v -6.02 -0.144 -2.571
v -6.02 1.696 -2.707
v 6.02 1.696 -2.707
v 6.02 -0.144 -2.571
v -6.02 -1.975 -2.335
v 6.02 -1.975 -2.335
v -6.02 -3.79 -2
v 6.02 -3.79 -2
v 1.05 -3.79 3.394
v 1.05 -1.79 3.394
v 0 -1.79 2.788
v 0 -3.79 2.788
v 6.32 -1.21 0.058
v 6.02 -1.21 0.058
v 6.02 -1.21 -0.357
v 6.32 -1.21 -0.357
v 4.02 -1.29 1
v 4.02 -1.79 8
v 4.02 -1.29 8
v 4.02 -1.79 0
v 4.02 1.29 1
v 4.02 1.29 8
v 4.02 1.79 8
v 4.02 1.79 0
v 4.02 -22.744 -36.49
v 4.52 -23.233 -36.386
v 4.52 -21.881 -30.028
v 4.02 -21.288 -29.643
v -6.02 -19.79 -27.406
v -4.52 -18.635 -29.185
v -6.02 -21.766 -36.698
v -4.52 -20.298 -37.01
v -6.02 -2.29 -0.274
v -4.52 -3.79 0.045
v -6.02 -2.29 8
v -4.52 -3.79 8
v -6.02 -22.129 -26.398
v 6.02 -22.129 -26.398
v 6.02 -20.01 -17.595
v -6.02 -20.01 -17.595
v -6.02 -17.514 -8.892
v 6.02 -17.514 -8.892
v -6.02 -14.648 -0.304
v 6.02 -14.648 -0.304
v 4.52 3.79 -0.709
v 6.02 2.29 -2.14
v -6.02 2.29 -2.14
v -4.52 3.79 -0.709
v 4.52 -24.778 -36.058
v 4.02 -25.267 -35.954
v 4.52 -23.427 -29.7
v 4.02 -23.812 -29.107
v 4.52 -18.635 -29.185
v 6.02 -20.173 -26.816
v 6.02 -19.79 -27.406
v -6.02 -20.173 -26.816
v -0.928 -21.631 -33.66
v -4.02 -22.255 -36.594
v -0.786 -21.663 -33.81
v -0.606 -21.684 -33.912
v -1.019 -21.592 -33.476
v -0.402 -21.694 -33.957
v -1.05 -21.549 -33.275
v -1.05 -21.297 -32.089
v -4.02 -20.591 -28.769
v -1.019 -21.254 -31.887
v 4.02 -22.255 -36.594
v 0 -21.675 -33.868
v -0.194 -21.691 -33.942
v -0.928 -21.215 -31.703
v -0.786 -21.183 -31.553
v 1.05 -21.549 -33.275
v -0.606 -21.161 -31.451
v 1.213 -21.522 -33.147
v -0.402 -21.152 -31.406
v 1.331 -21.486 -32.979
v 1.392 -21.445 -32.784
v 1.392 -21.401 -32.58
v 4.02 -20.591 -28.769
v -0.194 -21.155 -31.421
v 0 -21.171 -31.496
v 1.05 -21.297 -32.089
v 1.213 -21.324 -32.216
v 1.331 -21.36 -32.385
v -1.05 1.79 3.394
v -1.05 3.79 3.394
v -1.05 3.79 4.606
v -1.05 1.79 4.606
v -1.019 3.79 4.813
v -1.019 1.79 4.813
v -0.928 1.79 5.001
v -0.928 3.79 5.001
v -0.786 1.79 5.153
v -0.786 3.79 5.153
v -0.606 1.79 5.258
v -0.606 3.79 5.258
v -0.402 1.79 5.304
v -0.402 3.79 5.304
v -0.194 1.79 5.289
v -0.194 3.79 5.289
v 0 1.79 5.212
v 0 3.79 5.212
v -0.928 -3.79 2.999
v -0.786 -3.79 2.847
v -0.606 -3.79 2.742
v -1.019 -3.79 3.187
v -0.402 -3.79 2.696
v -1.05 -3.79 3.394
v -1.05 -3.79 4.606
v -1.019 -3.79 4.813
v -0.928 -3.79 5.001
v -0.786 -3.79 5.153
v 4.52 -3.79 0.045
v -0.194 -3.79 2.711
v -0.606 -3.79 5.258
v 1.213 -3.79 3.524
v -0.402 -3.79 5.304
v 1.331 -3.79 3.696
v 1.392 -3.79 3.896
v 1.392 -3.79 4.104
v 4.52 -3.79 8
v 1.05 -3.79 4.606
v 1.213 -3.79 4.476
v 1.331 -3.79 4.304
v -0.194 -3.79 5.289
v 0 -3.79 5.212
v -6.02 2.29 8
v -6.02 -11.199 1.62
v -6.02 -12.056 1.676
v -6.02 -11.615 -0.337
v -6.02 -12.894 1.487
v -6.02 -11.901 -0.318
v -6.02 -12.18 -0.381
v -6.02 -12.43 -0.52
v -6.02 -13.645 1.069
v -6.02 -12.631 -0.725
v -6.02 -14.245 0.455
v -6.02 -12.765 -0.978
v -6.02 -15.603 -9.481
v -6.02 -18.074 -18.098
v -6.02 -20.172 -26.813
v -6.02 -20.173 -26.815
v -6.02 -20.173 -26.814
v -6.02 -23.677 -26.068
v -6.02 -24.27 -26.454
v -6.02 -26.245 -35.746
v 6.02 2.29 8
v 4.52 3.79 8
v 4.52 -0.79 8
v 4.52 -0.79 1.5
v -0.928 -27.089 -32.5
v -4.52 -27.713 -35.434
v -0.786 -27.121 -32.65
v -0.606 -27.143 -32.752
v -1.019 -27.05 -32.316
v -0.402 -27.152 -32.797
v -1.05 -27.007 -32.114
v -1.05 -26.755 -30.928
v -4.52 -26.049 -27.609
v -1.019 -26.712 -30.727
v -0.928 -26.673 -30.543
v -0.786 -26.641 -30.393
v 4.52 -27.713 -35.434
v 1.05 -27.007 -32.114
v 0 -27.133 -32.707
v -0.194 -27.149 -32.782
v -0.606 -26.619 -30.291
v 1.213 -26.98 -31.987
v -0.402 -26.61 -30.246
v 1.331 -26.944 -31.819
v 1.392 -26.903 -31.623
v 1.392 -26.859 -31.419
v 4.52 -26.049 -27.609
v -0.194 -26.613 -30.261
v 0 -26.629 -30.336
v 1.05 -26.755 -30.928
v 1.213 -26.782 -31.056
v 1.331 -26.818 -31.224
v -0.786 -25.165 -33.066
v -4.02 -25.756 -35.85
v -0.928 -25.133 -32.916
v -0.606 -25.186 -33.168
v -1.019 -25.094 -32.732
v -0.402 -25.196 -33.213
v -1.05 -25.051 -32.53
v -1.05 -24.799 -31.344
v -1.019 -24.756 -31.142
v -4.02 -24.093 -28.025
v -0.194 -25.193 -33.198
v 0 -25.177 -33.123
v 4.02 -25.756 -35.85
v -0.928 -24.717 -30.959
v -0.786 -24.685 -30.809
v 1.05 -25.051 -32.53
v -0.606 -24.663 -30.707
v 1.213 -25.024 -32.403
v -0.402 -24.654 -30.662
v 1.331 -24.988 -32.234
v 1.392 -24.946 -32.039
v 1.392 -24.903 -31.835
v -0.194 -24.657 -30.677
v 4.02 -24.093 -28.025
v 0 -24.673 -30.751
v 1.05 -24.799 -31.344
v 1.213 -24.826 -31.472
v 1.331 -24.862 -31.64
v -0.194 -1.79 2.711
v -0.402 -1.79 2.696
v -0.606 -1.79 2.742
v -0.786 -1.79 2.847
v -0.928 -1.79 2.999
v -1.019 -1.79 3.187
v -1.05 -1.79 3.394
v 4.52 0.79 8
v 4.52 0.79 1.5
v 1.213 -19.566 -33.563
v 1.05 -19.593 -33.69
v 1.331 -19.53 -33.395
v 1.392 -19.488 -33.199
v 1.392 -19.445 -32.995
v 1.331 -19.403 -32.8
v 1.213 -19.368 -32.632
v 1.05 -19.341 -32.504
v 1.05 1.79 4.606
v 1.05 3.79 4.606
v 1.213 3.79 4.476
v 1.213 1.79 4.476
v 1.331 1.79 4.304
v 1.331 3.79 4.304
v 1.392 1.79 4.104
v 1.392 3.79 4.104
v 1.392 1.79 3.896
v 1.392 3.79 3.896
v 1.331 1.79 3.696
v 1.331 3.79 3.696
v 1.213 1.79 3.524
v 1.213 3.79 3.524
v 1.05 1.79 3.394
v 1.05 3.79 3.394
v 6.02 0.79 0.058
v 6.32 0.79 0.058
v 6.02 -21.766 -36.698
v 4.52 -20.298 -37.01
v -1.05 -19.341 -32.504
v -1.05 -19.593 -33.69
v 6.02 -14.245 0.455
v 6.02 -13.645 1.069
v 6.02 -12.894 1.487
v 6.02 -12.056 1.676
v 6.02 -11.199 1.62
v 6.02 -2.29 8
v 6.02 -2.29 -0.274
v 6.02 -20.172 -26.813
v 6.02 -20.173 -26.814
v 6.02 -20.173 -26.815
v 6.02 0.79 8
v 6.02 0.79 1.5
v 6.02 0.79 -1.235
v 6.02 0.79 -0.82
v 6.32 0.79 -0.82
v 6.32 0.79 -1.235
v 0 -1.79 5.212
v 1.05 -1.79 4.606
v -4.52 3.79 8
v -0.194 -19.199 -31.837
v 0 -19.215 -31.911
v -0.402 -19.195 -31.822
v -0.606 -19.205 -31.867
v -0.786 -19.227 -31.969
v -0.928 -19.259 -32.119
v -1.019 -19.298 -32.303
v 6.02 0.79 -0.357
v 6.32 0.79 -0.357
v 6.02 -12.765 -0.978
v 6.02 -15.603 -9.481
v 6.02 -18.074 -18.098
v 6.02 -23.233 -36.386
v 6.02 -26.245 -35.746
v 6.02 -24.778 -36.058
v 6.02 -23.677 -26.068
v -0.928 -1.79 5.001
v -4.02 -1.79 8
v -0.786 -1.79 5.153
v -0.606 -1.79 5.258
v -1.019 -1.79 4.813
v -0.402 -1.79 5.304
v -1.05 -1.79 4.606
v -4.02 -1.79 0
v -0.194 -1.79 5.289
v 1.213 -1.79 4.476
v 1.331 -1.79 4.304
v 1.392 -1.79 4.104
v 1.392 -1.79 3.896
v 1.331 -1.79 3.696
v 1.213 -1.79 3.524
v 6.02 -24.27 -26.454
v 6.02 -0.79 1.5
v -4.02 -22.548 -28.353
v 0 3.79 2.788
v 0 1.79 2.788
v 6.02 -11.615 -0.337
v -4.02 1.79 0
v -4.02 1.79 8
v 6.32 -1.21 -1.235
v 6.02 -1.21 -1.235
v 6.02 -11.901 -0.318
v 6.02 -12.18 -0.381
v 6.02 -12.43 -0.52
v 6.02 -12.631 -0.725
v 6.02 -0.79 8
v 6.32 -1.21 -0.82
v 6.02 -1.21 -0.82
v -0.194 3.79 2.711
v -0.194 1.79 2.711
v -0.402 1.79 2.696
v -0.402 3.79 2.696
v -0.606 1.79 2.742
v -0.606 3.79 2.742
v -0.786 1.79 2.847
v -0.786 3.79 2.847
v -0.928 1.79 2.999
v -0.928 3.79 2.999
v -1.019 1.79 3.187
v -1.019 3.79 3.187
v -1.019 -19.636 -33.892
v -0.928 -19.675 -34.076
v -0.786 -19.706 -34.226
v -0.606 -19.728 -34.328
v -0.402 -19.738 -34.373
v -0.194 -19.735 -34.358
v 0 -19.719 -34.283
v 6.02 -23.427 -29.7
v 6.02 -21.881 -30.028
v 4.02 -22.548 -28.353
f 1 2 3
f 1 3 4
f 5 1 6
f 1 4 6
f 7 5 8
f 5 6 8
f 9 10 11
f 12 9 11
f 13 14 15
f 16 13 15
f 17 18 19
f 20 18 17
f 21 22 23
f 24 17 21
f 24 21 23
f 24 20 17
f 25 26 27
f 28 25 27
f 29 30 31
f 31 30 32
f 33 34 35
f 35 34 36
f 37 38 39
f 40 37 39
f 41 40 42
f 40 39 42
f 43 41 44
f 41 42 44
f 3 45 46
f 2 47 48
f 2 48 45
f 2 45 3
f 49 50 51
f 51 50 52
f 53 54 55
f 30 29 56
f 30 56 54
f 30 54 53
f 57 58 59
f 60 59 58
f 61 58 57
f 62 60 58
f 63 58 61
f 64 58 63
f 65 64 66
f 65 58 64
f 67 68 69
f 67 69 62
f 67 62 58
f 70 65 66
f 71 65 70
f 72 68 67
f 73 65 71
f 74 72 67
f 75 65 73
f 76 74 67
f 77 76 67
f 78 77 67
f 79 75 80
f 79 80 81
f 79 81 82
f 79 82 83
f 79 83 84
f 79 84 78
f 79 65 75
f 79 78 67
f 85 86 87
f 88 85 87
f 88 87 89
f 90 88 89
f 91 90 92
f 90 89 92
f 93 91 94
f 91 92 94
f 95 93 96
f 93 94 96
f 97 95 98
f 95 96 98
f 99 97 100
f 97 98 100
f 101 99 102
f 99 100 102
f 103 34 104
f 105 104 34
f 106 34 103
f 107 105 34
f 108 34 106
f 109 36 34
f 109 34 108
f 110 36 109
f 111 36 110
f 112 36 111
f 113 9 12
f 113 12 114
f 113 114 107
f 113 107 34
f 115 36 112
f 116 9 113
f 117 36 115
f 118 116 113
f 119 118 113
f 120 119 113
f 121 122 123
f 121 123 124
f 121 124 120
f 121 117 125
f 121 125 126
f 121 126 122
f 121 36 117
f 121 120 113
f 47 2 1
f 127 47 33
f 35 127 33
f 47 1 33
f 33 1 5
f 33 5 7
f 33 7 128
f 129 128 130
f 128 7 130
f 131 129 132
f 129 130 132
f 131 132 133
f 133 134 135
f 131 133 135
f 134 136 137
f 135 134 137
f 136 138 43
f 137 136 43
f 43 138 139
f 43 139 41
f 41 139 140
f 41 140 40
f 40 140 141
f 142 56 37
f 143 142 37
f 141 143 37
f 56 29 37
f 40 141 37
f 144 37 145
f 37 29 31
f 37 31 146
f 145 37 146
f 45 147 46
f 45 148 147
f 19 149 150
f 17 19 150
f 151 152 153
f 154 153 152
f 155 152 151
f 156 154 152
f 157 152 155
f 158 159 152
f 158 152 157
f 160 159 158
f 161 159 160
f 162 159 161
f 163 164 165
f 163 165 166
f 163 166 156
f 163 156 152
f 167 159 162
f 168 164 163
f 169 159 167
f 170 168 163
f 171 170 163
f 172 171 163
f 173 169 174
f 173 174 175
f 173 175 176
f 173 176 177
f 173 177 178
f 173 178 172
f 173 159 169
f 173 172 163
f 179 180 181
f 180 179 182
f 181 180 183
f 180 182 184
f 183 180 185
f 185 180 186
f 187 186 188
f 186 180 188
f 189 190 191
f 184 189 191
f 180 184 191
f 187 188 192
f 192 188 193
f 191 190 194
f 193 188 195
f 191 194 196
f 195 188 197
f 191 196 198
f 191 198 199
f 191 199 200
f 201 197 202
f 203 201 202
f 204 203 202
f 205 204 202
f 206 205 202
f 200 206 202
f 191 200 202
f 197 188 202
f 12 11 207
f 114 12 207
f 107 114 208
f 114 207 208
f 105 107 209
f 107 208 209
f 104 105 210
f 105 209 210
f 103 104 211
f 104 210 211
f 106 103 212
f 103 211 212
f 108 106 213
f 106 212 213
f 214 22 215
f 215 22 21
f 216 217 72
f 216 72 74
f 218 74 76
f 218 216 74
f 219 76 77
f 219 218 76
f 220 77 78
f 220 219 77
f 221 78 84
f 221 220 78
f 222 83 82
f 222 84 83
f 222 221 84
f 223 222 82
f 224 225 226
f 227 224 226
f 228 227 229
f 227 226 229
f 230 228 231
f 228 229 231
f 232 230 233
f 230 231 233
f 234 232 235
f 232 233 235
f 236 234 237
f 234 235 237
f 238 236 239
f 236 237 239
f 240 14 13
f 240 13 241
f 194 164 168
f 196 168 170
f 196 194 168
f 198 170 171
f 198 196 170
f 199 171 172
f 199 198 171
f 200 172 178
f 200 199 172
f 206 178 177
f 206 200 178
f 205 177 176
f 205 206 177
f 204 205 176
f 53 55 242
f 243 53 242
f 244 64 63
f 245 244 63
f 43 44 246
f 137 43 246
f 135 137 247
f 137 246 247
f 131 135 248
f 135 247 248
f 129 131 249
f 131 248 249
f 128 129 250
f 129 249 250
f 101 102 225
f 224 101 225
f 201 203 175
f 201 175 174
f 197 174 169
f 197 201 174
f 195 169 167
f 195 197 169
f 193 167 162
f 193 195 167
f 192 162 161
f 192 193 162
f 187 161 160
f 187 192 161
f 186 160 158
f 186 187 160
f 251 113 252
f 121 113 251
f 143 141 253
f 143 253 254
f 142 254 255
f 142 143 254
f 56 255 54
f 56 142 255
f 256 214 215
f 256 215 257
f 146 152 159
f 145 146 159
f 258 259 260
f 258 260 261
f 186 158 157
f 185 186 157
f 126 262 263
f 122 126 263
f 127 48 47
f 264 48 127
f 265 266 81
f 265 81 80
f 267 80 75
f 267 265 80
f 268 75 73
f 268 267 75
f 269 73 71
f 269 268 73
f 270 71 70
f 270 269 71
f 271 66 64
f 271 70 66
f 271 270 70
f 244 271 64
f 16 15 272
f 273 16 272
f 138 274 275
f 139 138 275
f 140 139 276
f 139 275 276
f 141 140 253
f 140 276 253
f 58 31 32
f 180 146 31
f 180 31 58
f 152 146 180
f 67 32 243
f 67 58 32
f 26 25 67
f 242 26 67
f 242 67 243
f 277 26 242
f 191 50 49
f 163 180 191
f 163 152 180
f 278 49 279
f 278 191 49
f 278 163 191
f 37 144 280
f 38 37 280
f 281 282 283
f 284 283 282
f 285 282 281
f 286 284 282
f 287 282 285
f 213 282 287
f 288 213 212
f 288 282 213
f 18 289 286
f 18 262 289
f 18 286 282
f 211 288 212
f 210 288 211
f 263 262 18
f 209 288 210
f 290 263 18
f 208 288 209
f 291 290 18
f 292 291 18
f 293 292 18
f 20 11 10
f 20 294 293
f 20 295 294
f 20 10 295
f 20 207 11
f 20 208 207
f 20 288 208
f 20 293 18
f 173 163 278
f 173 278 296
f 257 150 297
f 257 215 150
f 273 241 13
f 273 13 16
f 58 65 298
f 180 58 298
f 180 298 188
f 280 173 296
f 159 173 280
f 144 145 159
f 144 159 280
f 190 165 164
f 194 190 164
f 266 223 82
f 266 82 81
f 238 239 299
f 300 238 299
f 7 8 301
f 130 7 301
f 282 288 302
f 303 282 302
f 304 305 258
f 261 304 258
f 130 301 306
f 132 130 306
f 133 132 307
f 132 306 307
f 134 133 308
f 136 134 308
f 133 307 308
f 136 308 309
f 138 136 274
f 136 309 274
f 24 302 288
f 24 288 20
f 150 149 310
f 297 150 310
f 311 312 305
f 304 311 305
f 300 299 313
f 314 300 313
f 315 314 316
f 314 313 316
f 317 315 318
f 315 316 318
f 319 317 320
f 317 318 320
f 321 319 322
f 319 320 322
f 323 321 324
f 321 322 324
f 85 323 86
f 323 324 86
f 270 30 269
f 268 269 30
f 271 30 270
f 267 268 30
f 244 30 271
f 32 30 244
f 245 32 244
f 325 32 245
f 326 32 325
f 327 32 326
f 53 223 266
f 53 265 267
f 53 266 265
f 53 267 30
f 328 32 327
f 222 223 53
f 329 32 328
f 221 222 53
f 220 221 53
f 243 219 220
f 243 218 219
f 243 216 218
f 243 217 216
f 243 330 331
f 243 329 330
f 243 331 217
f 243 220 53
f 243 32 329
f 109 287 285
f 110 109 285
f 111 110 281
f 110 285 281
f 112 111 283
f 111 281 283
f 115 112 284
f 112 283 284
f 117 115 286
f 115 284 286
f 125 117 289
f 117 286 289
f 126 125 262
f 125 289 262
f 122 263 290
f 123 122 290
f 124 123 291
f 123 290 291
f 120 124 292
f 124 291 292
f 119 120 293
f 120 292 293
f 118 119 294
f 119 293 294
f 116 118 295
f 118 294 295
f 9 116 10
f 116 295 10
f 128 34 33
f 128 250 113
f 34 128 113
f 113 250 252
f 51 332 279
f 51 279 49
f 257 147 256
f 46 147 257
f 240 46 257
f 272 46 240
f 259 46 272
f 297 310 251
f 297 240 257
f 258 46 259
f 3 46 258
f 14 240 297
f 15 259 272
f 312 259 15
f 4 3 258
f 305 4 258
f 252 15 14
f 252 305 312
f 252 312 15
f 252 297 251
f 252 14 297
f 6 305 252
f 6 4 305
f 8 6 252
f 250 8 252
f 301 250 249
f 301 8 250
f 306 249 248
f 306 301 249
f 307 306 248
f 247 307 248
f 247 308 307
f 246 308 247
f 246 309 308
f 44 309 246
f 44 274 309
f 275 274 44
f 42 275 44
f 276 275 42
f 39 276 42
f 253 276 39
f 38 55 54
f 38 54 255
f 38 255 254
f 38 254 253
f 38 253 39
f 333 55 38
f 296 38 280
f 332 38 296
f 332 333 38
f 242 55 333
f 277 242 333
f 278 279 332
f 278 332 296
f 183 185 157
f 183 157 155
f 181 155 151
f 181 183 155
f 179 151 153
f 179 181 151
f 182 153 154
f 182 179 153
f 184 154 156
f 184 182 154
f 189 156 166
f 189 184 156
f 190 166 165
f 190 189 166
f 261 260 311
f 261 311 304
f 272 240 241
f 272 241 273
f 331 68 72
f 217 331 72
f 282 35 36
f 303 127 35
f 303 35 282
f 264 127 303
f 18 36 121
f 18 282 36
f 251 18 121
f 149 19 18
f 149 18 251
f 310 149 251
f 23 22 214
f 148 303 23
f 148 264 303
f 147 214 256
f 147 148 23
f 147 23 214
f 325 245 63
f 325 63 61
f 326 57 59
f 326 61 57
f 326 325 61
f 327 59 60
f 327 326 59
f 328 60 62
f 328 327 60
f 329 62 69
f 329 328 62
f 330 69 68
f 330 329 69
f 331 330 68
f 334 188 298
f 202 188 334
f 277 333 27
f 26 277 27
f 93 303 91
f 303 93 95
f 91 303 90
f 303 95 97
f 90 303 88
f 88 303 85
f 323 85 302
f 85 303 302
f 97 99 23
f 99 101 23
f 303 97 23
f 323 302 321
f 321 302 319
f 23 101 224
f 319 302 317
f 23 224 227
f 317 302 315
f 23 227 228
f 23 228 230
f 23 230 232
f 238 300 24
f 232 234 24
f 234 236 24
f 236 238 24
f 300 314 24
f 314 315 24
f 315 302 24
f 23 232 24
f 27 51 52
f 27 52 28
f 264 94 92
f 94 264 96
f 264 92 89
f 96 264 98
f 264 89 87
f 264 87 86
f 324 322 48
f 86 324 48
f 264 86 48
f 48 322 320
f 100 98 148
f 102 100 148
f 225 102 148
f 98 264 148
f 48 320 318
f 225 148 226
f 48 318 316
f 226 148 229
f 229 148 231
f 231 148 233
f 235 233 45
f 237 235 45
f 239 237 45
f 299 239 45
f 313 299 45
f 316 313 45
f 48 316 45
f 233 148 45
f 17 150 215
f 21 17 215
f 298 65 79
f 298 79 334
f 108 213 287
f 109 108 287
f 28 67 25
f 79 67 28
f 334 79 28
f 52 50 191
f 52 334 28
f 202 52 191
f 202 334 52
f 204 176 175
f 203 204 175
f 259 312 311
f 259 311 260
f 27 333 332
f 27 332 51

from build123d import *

# Parameters (mm, degrees)
SKETCH1_W                      = 12.04
SKETCH1_H                      = 7.58
SKETCH1_W_2                    = 8.04
SKETCH1_H_2                    = 3.58
BOSS_EXTRUDE1_DEPTH            = 8
SKETCH1_2_W                    = 12.04
SKETCH1_2_H                    = 7.58
SKETCH1_2_W_2                  = 8.04
SKETCH1_2_H_2                  = 3.58
BOSS_EXTRUDE2_DEPTH            = 2
EXTRUDE_THIN1_DEPTH            = 12.04
SKETCH5_W                      = 12.04
SKETCH5_H                      = 7.58
SKETCH5_W_2                    = 8.04
SKETCH5_H_2                    = 3.58
BOSS_EXTRUDE4_DEPTH            = 8
SKETCH5_4_W                    = 12.04
SKETCH5_4_H                    = 7.58
BOSS_EXTRUDE5_DEPTH            = 2
CHAMFER1_SIZE                  = 1.5
CHAMFER2_START                 = -7
CHAMFER2_DEPTH                 = 14
CUT_EXTRUDE1_REACH             = 50.973
CUT_EXTRUDE1_DIRECTION_2_DEPTH = 49.973440368
CUT_EXTRUDE2_DEPTH             = 48.541116576
CUT_EXTRUDE2_DEPTH_BACK        = 48.541116576
SKETCH8_W                      = 2
SKETCH8_H                      = 1.58
CUT_EXTRUDE3_DEPTH             = 6.5
SKETCH9_W                      = 4
SKETCH9_H                      = 1.58
CUT_EXTRUDE4_DEPTH             = 6.5
CHAMFER3_SIZE                  = 0.5
SKETCH10_W                     = 0.414634146
SKETCH10_H                     = 2
SKETCH10_W_2                   = 0.414634147
BOSS_EXTRUDE6_DEPTH            = 0.3


with BuildPart() as part:
    # Sketch1 → Boss-Extrude1 (new body)
    with BuildSketch(Plane.XY):
        Rectangle(SKETCH1_W, SKETCH1_H)
        Rectangle(SKETCH1_W_2, SKETCH1_H_2, mode=Mode.SUBTRACT)
    extrude(amount=BOSS_EXTRUDE1_DEPTH)

    # Sketch1<2> → Boss-Extrude2 (add)
    # profile 1 of 2: a face of its own
    with BuildSketch(Plane.XY):
        Rectangle(SKETCH1_2_W, SKETCH1_2_H)
        Rectangle(SKETCH1_2_W_2, SKETCH1_2_H_2, mode=Mode.SUBTRACT)
    # profile 2 of 2: a face of its own
    with BuildSketch(Plane.XY):
        Rectangle(SKETCH1_2_W_2, SKETCH1_2_H_2)
    extrude(amount=-BOSS_EXTRUDE2_DEPTH)

    # Sketch3 → Extrude-Thin1 (add)
    with BuildSketch(Plane(origin=(6.02, 9.81, 0), x_dir=(0, -1, 0), z_dir=(1, 0, 0))):
        with BuildLine():
            Line((6.02, 2.744137986), (6.52, 2.744137986))
            ThreePointArc((6.52, 2.744137986), (10.07949931, 2.557592532), (13.6, 2))
            Line((13.6, 2), (21.425180806, 0.336706473))
            ThreePointArc((21.425180806, 0.336706473), (22.120268588, 0.441550315), (22.574623539, 0.977927827))
            ThreePointArc((22.574623539, 0.977927827), (26.849152106, 14.317688881), (30.219561316, 27.914054616))
            Line((30.219561316, 27.914054616), (30.401286915, 28.769006338))
            Line((30.401286915, 28.769006338), (32.357582116, 28.353182957))
            Line((32.357582116, 28.353182957), (32.175856518, 27.498231234))
            ThreePointArc((32.175856518, 27.498231234), (28.773161162, 13.771621897), (24.457685624, 0.304075332))
            ThreePointArc((24.457685624, 0.304075332), (23.094620772, -1.305057203), (21.009357424, -1.619588728))
            Line((21.009357424, -1.619588728), (13.184176618, 0.043704799))
            ThreePointArc((13.184176618, 0.043704799), (9.870442383, 0.568548741), (6.52, 0.744137986))
            Line((6.52, 0.744137986), (6.02, 0.744137986))
            Line((6.02, 0.744137986), (6.02, 2.744137986))
        make_face()
    extrude(amount=-EXTRUDE_THIN1_DEPTH)



with BuildPart() as body_2:
    # Sketch5 → Boss-Extrude4 (new body)
    with BuildSketch(Plane(origin=(0, 484.189145571, -136.063399466), x_dir=(1, 0, 0), z_dir=(0, -0.20791169081775487, -0.9781476007338067))):
        with Locations((0, 517.847527624)):
            Rectangle(SKETCH5_W, SKETCH5_H)
        with Locations((0, 517.847527624)):
            Rectangle(SKETCH5_W_2, SKETCH5_H_2, mode=Mode.SUBTRACT)
    extrude(amount=BOSS_EXTRUDE4_DEPTH)


with BuildPart() as part_1:
    add(part.part)

    add(body_2.part)  # Boss-Extrude5 merges body 2
    # Sketch5<4> → Boss-Extrude5 (add)
    with BuildSketch(Plane(origin=(0, 484.189145571, -136.063399466), x_dir=(1, 0, 0), z_dir=(0, -0.20791169081775487, -0.9781476007338067))):
        with Locations((0, 517.847527624)):
            Rectangle(SKETCH5_4_W, SKETCH5_4_H)
    extrude(amount=-BOSS_EXTRUDE5_DEPTH)

    # Chamfer1
    chamfer1_edges = [part_1.edges().sort_by_distance(p)[0] for p in [
        (6.02, -26.673085599, -30.543301906),
        (-6.02, -26.673085599, -30.543301906),
        (6.02, 3.79, 2.627931007),
        (6.02, -3.79, 4.022340595),
        (-6.02, -3.79, 4.022340595),
        (-6.02, 3.79, 2.627931007),
        (6.02, -19.258726786, -32.119272522),
        (-6.02, -19.258726786, -32.119272522),
    ]]
    chamfer(chamfer1_edges, length=CHAMFER1_SIZE)

    # Chamfer2: read off the stored shape, not the designer's step
    # Chamfer2 outline → Chamfer2 (cut)
    with BuildSketch(Plane.YZ.offset(CHAMFER2_START)):
        with BuildLine():
            Line((3.79, -2.744137986), (3.79, -0.709020541))
            Line((3.79, -0.709020541), (1.696404781, -2.706829325))
            ThreePointArc((1.696404781, -2.706829325), (2.492984056, -2.734809543), (3.29, -2.744137986))
            Line((3.29, -2.744137986), (3.79, -2.744137986))
        make_face()
        Polygon((-25.633527145, -25.652563902), (-26.049350527, -27.608859104), (-23.677231944, -26.068387284), align=None)
        with BuildLine():
            ThreePointArc((-20.172493797, -26.813342374), (-20.172815684, -26.814817596), (-20.173137561, -26.81629282))
            Line((-20.173137561, -26.81629282), (-18.634991713, -29.18482972))
            Line((-18.634991713, -29.18482972), (-18.219168332, -27.228534519))
            Line((-18.219168332, -27.228534519), (-20.172493797, -26.813342374))
        make_face()
    extrude(amount=CHAMFER2_DEPTH, mode=Mode.SUBTRACT)

    # Cut-Extrude1: up to this face of the body (flat: up to its plane)
    cut_extrude1_end = Plane(part_1.part.faces().sort_by_distance((0, -3.79, 4.022340595))[0])
    # Sketch6 → Cut-Extrude1 (cut, up to the picked face)
    with BuildSketch(Plane(origin=(0, 3.79, 0), x_dir=(1, 0, 0), z_dir=(0, 1, 0)), mode=Mode.PRIVATE) as cut_extrude1_sk1:
        with BuildLine():
            Line((1.05, -3.393782217), (0, -2.787564435))
            ThreePointArc((0, -2.787564435), (-0.7, -2.787564435), (-1.05, -3.393782217))
            Line((-1.05, -3.393782217), (-1.05, -4.606217783))
            ThreePointArc((-1.05, -4.606217783), (-0.7, -5.212435565), (0, -5.212435565))
            Line((0, -5.212435565), (1.05, -4.606217783))
            ThreePointArc((1.05, -4.606217783), (1.4, -4), (1.05, -3.393782217))
        make_face()
    cut_extrude1_tool1 = split(extrude(cut_extrude1_sk1.sketch, amount=-CUT_EXTRUDE1_REACH, mode=Mode.PRIVATE), bisect_by=cut_extrude1_end, keep=Keep.BOTH, mode=Mode.PRIVATE)
    add(cut_extrude1_tool1.solids().sort_by(Axis((0, 3.79, 4), (0, -1, 0)))[0], mode=Mode.SUBTRACT)

    # Sketch6 → Cut-Extrude1 direction 2 (cut)
    with BuildSketch(Plane(origin=(0, 3.79, 0), x_dir=(1, 0, 0), z_dir=(0, 1, 0))):
        with BuildLine():
            Line((1.05, -3.393782217), (0, -2.787564435))
            ThreePointArc((0, -2.787564435), (-0.7, -2.787564435), (-1.05, -3.393782217))
            Line((-1.05, -3.393782217), (-1.05, -4.606217783))
            ThreePointArc((-1.05, -4.606217783), (-0.7, -5.212435565), (0, -5.212435565))
            Line((0, -5.212435565), (1.05, -4.606217783))
            ThreePointArc((1.05, -4.606217783), (1.4, -4), (1.05, -3.393782217))
        make_face()
    extrude(amount=CUT_EXTRUDE1_DIRECTION_2_DEPTH, mode=Mode.SUBTRACT)

    # Sketch7 → Cut-Extrude2 (cut, two sides: drawn at the far end of the back side and taken through both)
    with BuildSketch(Plane(origin=(0, -19.308540852, 4.104157054), x_dir=(1, 0, 0), z_dir=(0, -0.9781476007338067, 0.2079116908177549)).offset(-CUT_EXTRUDE2_DEPTH_BACK)):
        with BuildLine():
            Line((1.05, -35.815286021), (0, -35.209068239))
            ThreePointArc((0, -35.209068239), (-0.7, -35.209068239), (-1.05, -35.815286021))
            Line((-1.05, -35.815286021), (-1.05, -37.027721587))
            ThreePointArc((-1.05, -37.027721587), (-0.7, -37.633939369), (0, -37.633939369))
            Line((0, -37.633939369), (1.05, -37.027721587))
            ThreePointArc((1.05, -37.027721587), (1.4, -36.421503804), (1.05, -35.815286021))
        make_face()
    extrude(amount=CUT_EXTRUDE2_DEPTH + CUT_EXTRUDE2_DEPTH_BACK, mode=Mode.SUBTRACT)

    # Sketch8 → Cut-Extrude3 (cut)
    with BuildSketch(Plane.XY.offset(8)):
        with Locations((5.02, 0)):
            Rectangle(SKETCH8_W, SKETCH8_H)
    extrude(amount=-CUT_EXTRUDE3_DEPTH, mode=Mode.SUBTRACT)

    # Sketch9 → Cut-Extrude4 (cut)
    with BuildSketch(Plane(origin=(0, -8.404103201, -39.538196964), x_dir=(-1, 0, 0), z_dir=(0, -0.20791169081775673, -0.9781476007338064))):
        with Locations((-6.02, -15.949905141)):
            Rectangle(SKETCH9_W, SKETCH9_H)
    extrude(amount=-CUT_EXTRUDE4_DEPTH, mode=Mode.SUBTRACT)

    # Chamfer3
    chamfer3_edges = [part_1.edges().sort_by_distance(p)[0] for p in [
        (4.02, -0.79, 4.75),
        (4.02, 0.79, 4.75),
        (4.02, 0, 1.5),
        (4.02, -24.102488256, -32.87879528),
        (4.02, -22.654038656, -29.864065813),
        (4.02, -22.557015047, -33.207295751),
    ]]
    chamfer(chamfer3_edges, length=CHAMFER3_SIZE)

    # Sketch10 → Boss-Extrude6 (add)
    with BuildSketch(Plane(origin=(6.02, 0, 0), x_dir=(0, 0, -1), z_dir=(1, 0, 0))):
        with Locations((0.149293265, -0.21)):
            Rectangle(SKETCH10_W, SKETCH10_H)
        with Locations((1.027342045, -0.21)):
            Rectangle(SKETCH10_W_2, SKETCH10_H)
    extrude(amount=BOSS_EXTRUDE6_DEPTH)


solid = part_1.part
